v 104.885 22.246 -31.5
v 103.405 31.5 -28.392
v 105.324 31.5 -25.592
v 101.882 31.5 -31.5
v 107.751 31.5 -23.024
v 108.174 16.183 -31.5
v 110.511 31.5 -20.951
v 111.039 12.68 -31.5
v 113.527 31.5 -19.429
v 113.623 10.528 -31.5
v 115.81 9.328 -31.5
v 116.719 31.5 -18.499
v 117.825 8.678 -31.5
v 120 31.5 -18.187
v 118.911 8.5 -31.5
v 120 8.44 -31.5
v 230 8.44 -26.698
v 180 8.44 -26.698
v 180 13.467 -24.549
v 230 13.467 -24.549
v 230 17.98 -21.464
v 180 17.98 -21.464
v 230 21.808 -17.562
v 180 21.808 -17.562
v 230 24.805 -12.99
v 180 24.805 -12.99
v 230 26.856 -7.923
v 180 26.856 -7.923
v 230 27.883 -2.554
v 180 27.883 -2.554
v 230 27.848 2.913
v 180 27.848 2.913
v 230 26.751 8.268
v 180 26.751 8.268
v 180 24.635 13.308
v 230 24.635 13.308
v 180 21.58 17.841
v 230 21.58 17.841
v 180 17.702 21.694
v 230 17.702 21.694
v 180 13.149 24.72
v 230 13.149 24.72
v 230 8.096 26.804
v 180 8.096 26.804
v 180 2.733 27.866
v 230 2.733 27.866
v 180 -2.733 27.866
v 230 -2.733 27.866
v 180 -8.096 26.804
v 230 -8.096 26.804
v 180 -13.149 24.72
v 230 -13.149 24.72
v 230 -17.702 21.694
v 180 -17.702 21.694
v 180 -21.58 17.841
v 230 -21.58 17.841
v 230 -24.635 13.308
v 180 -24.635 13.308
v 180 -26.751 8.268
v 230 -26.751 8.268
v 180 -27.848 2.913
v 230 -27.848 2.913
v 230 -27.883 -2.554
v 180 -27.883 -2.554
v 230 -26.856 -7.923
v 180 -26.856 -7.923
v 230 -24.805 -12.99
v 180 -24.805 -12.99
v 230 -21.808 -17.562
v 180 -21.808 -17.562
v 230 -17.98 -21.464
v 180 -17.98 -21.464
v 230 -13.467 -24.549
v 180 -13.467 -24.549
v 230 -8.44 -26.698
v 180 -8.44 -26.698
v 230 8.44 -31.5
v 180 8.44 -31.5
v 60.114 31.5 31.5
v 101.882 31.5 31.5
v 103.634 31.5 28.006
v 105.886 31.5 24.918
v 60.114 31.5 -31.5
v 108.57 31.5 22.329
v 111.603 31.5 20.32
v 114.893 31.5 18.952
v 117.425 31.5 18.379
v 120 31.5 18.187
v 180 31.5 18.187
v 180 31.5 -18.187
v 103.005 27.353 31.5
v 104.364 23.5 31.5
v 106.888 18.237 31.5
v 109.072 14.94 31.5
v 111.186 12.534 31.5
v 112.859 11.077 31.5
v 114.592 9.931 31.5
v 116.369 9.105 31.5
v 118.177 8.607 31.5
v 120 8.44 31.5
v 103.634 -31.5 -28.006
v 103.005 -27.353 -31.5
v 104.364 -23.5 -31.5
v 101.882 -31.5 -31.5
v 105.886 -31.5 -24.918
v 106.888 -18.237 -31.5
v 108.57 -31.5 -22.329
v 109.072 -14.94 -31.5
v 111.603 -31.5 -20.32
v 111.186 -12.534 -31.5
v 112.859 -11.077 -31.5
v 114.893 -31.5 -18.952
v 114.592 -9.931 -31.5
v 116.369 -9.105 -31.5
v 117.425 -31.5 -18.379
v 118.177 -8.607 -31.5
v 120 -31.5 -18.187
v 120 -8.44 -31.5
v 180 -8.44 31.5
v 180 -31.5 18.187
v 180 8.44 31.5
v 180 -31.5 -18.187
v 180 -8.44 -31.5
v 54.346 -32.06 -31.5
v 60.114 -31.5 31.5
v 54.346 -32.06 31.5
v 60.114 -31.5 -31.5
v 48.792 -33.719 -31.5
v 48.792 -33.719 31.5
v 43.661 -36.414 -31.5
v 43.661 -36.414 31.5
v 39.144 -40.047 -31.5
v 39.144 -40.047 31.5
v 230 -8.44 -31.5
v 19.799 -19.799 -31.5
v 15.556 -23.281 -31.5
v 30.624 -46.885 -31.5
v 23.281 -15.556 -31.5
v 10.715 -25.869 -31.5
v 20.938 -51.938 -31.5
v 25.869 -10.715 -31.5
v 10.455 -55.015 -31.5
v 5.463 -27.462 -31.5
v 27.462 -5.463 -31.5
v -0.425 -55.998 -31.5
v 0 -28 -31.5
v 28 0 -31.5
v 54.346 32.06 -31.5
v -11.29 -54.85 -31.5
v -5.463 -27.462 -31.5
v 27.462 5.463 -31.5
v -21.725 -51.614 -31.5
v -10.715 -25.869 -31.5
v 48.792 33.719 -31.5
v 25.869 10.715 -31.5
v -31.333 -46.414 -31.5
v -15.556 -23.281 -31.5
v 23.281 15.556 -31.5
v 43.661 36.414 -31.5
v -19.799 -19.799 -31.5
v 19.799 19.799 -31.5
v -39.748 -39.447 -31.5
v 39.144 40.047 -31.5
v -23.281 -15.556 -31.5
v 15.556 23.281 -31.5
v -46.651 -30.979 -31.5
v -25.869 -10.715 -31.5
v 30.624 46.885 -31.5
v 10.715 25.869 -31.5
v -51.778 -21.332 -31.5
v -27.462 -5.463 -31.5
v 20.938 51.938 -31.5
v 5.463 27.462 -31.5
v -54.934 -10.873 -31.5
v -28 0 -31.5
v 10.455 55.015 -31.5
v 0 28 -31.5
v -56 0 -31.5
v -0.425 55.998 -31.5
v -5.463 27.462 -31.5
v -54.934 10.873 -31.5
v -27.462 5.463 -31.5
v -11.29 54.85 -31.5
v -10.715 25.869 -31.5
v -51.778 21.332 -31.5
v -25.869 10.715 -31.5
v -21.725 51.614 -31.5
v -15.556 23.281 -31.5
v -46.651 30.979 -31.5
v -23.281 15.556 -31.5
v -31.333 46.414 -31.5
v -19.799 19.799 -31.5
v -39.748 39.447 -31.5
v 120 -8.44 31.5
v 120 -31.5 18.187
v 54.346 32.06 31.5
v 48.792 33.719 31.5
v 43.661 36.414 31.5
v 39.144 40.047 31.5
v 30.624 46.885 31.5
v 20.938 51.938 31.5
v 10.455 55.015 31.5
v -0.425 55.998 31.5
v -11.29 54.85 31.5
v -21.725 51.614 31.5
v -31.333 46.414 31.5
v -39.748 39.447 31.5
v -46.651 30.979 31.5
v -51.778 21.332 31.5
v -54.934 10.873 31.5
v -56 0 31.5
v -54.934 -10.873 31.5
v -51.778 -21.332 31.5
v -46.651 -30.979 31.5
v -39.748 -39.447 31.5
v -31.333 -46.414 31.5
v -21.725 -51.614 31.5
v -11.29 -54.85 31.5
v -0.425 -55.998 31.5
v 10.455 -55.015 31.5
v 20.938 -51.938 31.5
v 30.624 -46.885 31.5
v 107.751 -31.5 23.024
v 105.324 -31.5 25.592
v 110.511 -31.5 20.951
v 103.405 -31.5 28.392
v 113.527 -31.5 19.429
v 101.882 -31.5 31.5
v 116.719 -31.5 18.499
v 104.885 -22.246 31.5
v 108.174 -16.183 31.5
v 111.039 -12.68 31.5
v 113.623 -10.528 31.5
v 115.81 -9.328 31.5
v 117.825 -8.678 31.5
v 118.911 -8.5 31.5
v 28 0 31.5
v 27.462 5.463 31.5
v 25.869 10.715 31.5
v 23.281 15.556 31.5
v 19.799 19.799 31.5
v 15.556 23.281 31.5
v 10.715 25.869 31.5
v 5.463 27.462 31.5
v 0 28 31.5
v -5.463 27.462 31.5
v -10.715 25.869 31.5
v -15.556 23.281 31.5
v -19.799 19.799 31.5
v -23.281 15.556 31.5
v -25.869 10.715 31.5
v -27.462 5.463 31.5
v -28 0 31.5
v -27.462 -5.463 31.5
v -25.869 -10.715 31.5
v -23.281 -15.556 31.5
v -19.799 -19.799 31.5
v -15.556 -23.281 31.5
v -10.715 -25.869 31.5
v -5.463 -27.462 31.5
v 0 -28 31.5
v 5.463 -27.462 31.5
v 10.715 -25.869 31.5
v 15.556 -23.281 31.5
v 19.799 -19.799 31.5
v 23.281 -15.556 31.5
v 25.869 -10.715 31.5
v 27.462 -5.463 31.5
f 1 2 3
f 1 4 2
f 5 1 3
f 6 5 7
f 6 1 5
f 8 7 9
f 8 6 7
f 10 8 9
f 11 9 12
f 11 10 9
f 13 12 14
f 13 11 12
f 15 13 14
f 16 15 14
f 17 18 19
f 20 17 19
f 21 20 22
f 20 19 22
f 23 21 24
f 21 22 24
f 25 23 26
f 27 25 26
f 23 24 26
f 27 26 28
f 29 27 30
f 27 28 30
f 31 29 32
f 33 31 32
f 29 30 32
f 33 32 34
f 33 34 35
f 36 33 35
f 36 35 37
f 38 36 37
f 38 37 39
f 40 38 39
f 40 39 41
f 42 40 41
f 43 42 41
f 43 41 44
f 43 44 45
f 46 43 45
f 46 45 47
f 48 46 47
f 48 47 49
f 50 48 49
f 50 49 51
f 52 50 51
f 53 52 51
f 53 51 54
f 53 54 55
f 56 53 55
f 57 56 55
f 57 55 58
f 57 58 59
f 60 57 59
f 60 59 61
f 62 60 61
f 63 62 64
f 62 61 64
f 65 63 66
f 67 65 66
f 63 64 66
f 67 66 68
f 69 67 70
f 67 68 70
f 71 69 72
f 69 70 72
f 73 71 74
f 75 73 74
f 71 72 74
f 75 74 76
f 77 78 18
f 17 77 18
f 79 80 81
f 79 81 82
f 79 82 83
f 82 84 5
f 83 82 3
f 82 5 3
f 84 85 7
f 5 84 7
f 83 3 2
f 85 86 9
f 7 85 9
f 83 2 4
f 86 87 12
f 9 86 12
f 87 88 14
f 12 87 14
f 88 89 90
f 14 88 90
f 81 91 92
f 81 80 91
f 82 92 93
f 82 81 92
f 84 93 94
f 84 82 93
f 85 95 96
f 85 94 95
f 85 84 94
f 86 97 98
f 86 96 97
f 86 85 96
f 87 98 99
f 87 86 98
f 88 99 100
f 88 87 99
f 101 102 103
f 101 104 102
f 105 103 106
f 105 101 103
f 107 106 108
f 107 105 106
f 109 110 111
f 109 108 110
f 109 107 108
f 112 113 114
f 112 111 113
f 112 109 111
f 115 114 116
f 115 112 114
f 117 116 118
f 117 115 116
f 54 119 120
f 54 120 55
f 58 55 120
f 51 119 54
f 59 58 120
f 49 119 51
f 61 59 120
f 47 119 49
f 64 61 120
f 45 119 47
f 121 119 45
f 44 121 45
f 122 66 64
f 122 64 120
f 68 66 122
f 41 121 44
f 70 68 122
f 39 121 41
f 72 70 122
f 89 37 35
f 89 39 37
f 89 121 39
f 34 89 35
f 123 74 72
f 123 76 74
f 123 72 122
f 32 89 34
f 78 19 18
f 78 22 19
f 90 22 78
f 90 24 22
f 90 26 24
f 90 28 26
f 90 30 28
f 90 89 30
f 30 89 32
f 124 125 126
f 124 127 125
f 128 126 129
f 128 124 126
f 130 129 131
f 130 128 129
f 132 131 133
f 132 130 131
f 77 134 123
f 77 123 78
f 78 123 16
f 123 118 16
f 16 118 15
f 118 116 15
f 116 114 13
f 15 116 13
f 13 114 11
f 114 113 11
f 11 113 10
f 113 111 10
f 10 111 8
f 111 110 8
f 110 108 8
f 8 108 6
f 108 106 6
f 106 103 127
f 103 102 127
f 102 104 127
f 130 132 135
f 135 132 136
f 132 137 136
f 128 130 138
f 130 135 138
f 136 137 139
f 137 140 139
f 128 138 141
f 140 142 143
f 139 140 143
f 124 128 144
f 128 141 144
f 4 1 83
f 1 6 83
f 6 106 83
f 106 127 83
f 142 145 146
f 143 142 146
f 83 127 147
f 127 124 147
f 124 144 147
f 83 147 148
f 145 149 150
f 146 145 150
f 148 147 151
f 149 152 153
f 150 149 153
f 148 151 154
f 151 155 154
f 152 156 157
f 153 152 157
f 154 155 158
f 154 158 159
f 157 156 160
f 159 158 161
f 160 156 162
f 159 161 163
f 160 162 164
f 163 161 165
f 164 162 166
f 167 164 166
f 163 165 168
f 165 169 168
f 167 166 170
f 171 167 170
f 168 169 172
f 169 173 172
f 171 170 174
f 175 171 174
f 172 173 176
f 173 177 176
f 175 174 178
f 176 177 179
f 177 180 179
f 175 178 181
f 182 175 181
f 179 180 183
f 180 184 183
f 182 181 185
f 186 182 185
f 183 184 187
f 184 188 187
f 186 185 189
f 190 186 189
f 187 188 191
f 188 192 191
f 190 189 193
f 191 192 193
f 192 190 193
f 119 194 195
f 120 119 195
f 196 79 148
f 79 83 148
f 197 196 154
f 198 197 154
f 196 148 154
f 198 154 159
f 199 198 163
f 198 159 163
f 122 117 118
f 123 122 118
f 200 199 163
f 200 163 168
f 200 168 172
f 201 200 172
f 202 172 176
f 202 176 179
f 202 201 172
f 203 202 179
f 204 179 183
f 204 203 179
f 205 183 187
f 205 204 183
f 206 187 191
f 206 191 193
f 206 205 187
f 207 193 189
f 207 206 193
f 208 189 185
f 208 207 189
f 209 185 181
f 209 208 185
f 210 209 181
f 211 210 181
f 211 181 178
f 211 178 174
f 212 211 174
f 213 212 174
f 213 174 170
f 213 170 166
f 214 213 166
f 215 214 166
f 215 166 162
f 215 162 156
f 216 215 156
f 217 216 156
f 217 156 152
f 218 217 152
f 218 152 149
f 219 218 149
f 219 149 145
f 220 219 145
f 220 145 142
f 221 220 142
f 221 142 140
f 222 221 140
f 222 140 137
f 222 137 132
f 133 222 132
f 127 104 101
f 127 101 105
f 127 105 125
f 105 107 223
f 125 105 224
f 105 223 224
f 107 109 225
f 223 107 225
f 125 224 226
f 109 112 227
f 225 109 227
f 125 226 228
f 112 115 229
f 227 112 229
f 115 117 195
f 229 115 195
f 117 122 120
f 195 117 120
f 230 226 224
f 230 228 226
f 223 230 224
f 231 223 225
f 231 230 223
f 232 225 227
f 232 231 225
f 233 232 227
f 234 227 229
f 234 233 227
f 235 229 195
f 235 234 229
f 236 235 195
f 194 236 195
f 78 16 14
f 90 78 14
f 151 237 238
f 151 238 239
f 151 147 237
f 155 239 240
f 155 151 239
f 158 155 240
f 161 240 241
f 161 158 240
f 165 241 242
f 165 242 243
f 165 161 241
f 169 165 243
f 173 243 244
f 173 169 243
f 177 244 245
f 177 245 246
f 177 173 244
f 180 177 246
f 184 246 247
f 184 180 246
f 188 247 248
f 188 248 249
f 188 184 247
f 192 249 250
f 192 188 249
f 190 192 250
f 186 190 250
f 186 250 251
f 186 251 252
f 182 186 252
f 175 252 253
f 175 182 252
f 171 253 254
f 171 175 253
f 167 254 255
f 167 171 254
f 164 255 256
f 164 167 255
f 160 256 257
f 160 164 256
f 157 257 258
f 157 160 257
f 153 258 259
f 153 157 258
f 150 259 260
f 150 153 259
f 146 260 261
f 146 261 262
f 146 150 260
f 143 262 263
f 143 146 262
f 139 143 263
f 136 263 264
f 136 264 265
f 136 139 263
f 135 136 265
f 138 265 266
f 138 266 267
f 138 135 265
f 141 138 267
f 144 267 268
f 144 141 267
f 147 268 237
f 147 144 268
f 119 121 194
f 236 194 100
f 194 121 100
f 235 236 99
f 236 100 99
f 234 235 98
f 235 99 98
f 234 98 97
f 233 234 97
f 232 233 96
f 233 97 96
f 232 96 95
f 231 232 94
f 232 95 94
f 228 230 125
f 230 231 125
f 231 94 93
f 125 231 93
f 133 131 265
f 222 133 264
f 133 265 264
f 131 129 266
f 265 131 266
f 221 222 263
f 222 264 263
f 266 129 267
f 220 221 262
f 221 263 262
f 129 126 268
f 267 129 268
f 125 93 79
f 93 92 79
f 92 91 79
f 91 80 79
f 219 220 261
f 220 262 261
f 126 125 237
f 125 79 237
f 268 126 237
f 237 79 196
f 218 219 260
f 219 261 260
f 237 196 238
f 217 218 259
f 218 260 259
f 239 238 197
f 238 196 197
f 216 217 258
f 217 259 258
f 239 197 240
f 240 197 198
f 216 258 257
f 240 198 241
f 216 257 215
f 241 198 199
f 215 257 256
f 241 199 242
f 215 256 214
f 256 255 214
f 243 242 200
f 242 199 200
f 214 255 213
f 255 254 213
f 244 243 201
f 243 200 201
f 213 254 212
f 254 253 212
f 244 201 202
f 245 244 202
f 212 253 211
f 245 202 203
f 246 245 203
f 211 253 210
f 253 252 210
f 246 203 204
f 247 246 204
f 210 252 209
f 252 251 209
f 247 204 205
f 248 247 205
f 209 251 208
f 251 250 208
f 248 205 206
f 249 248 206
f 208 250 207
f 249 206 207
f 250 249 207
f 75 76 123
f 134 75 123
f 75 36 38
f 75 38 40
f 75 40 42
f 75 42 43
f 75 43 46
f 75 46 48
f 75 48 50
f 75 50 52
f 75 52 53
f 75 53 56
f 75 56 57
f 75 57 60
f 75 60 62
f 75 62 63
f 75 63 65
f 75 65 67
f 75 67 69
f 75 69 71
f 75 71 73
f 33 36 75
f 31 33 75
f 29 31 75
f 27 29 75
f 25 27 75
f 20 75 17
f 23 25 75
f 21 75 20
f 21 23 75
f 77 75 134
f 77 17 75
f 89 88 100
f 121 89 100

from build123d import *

# Parameters (mm, degrees)
SKETCH1_R                = 56
SKETCH1_R_2              = 28
BOSS_EXTRUDE1_DEPTH      = 31.5
BOSS_EXTRUDE2_REACH      = 246.59
BOSS_EXTRUDE2_END_RADIUS = 56
SKETCH2_W                = 63
SKETCH2_H                = 63
FILLET1_R                = 30
SKETCH3_R                = 28
BOSS_EXTRUDE3_DEPTH      = 50
SKETCH4_R                = 53.440477433
CUT_EXTRUDE1_DEPTH       = 80
FILLET2_R                = 20
BOSS_EXTRUDE4_DEPTH      = 50


with BuildPart() as part:
    # Sketch1 → Boss-Extrude1 (new, symmetric)
    with BuildSketch(Plane.XY):
        Circle(SKETCH1_R)
        Circle(SKETCH1_R_2, mode=Mode.SUBTRACT)
    extrude(amount=BOSS_EXTRUDE1_DEPTH, both=True)

    # Boss-Extrude2: up to this cylinder (the profile starts outside it)
    boss_extrude2_end = Plane(origin=(0, 0, 0), z_dir=(0, 0, -1)) * Cylinder(BOSS_EXTRUDE2_END_RADIUS, 606.18, mode=Mode.PRIVATE)
    # Sketch2 → Boss-Extrude2 (add, up to the surface)
    with BuildSketch(Plane(origin=(180, 0, 0), x_dir=(0, 0, -1), z_dir=(1, 0, 0)), mode=Mode.PRIVATE) as boss_extrude2_sk1:
        Rectangle(SKETCH2_W, SKETCH2_H)
    boss_extrude2_tool1 = extrude(boss_extrude2_sk1.sketch, amount=-BOSS_EXTRUDE2_REACH, mode=Mode.PRIVATE) - boss_extrude2_end
    add(boss_extrude2_tool1.solids().sort_by_distance((180, 0, 0))[0])

    # Fillet1
    fillet1_edges = [part.edges().sort_by_distance(p)[0] for p in [
        (46.300647944, -31.5, 0),
        (46.300647944, 31.5, 0),
    ]]
    fillet(fillet1_edges, radius=FILLET1_R)

    # Sketch3 → Boss-Extrude3 (add)
    with BuildSketch(Plane(origin=(180, 0, 0), x_dir=(0, 0, -1), z_dir=(1, 0, 0))):
        Circle(SKETCH3_R)
    extrude(amount=BOSS_EXTRUDE3_DEPTH)

    # Sketch4 → Cut-Extrude1 (cut)
    with BuildSketch(Plane(origin=(180, 0, 0), x_dir=(0, 0, -1), z_dir=(1, 0, 0))):
        Circle(SKETCH4_R)
        Polygon((18.186533479, -31.5), (36.373066959, 0), (18.186533479, 31.5), (-18.186533479, 31.5), (-36.373066959, 0), (-18.186533479, -31.5), align=None, mode=Mode.SUBTRACT)
    extrude(amount=-CUT_EXTRUDE1_DEPTH, mode=Mode.SUBTRACT)

    # Fillet2
    # the kernel refuses this fillet: 20 mm, written as the material it adds along each edge
    with BuildSketch(Plane(origin=(100, 74.801270189, -6.813466521), x_dir=(1, 0, 0), z_dir=(0, -0.8660254037844388, 0.4999999999999998))) as fillet2_piece_1_section:
        with BuildLine():
            CenterArc((FILLET2_R, FILLET2_R), FILLET2_R, 180, 90)
            Line((0, FILLET2_R), (0, 0))
            Line((0, 0), (FILLET2_R, 0))
        make_face()
    fillet2_piece_1 = extrude(amount=126.626933041, mode=Mode.PRIVATE)
    fillet2_piece_1 = split(fillet2_piece_1, bisect_by=Plane(origin=(105.889651232, 22.332439455, 31.5), z_dir=(0, 0, -1)), keep=Keep.TOP, mode=Mode.PRIVATE)
    fillet2_piece_1 = split(fillet2_piece_1, bisect_by=Plane(origin=(105.889651232, 31.5, 26.207106452), z_dir=(0, -1, 0)), keep=Keep.TOP, mode=Mode.PRIVATE)
    add(fillet2_piece_1)
    with BuildSketch(Plane(origin=(100, 34.860870628, 56.5), x_dir=(0, -0.4999999999999999, 0.8660254037844387), z_dir=(0, -0.8660254037844388, -0.4999999999999999))) as fillet2_piece_2_section:
        with BuildLine():
            CenterArc((FILLET2_R, -FILLET2_R), FILLET2_R, 90, 90)
            Line((0, -FILLET2_R), (0, 0))
            Line((0, 0), (FILLET2_R, 0))
        make_face()
    fillet2_piece_2 = extrude(amount=126.626933041, mode=Mode.PRIVATE)
    fillet2_piece_2 = split(fillet2_piece_2, bisect_by=Plane(origin=(105.889651233, -31.5, 26.207106452), z_dir=(0, 1, 0)), keep=Keep.TOP, mode=Mode.PRIVATE)
    fillet2_piece_2 = split(fillet2_piece_2, bisect_by=Plane(origin=(105.889651233, -22.332439456, 31.5), z_dir=(0, 0, -1)), keep=Keep.TOP, mode=Mode.PRIVATE)
    add(fillet2_piece_2)
    with BuildSketch(Plane(origin=(100, -74.801270189, 6.813466521), x_dir=(0, -0.4999999999999999, -0.8660254037844387), z_dir=(0, 0.8660254037844387, -0.49999999999999994))) as fillet2_piece_3_section:
        with BuildLine():
            CenterArc((FILLET2_R, -FILLET2_R), FILLET2_R, 90, 90)
            Line((0, -FILLET2_R), (0, 0))
            Line((0, 0), (FILLET2_R, 0))
        make_face()
    fillet2_piece_3 = extrude(amount=126.626933041, mode=Mode.PRIVATE)
    fillet2_piece_3 = split(fillet2_piece_3, bisect_by=Plane(origin=(105.889651233, -31.5, -26.207106452), z_dir=(0, 1, 0)), keep=Keep.TOP, mode=Mode.PRIVATE)
    fillet2_piece_3 = split(fillet2_piece_3, bisect_by=Plane(origin=(105.889651233, -22.332439456, -31.5), z_dir=(0, 0, 1)), keep=Keep.TOP, mode=Mode.PRIVATE)
    add(fillet2_piece_3)
    with BuildSketch(Plane(origin=(100, -34.860870628, -56.5), x_dir=(0, 0.49999999999999983, -0.8660254037844387), z_dir=(0, 0.8660254037844388, 0.4999999999999999))) as fillet2_piece_4_section:
        with BuildLine():
            CenterArc((FILLET2_R, -FILLET2_R), FILLET2_R, 90, 90)
            Line((0, -FILLET2_R), (0, 0))
            Line((0, 0), (FILLET2_R, 0))
        make_face()
    fillet2_piece_4 = extrude(amount=126.626933041, mode=Mode.PRIVATE)
    fillet2_piece_4 = split(fillet2_piece_4, bisect_by=Plane(origin=(105.889651233, 22.332439456, -31.5), z_dir=(0, 0, 1)), keep=Keep.TOP, mode=Mode.PRIVATE)
    fillet2_piece_4 = split(fillet2_piece_4, bisect_by=Plane(origin=(105.889651233, 31.5, -26.207106452), z_dir=(0, -1, 0)), keep=Keep.TOP, mode=Mode.PRIVATE)
    add(fillet2_piece_4)

    # Sketch5 → Boss-Extrude4 (add)
    with BuildSketch(Plane(origin=(180, 0, 0), x_dir=(0, 0, -1), z_dir=(1, 0, 0))):
        with BuildLine():
            Line((31.5, 8.440399562), (26.697558975, 8.440399562))
            ThreePointArc((26.697558975, 8.440399562), (28, 0), (26.697558975, -8.440399562))
            Line((26.697558975, -8.440399562), (31.5, -8.440399562))
            Line((31.5, -8.440399562), (31.5, 8.440399562))
        make_face()
    extrude(amount=BOSS_EXTRUDE4_DEPTH)


solid = part.part
